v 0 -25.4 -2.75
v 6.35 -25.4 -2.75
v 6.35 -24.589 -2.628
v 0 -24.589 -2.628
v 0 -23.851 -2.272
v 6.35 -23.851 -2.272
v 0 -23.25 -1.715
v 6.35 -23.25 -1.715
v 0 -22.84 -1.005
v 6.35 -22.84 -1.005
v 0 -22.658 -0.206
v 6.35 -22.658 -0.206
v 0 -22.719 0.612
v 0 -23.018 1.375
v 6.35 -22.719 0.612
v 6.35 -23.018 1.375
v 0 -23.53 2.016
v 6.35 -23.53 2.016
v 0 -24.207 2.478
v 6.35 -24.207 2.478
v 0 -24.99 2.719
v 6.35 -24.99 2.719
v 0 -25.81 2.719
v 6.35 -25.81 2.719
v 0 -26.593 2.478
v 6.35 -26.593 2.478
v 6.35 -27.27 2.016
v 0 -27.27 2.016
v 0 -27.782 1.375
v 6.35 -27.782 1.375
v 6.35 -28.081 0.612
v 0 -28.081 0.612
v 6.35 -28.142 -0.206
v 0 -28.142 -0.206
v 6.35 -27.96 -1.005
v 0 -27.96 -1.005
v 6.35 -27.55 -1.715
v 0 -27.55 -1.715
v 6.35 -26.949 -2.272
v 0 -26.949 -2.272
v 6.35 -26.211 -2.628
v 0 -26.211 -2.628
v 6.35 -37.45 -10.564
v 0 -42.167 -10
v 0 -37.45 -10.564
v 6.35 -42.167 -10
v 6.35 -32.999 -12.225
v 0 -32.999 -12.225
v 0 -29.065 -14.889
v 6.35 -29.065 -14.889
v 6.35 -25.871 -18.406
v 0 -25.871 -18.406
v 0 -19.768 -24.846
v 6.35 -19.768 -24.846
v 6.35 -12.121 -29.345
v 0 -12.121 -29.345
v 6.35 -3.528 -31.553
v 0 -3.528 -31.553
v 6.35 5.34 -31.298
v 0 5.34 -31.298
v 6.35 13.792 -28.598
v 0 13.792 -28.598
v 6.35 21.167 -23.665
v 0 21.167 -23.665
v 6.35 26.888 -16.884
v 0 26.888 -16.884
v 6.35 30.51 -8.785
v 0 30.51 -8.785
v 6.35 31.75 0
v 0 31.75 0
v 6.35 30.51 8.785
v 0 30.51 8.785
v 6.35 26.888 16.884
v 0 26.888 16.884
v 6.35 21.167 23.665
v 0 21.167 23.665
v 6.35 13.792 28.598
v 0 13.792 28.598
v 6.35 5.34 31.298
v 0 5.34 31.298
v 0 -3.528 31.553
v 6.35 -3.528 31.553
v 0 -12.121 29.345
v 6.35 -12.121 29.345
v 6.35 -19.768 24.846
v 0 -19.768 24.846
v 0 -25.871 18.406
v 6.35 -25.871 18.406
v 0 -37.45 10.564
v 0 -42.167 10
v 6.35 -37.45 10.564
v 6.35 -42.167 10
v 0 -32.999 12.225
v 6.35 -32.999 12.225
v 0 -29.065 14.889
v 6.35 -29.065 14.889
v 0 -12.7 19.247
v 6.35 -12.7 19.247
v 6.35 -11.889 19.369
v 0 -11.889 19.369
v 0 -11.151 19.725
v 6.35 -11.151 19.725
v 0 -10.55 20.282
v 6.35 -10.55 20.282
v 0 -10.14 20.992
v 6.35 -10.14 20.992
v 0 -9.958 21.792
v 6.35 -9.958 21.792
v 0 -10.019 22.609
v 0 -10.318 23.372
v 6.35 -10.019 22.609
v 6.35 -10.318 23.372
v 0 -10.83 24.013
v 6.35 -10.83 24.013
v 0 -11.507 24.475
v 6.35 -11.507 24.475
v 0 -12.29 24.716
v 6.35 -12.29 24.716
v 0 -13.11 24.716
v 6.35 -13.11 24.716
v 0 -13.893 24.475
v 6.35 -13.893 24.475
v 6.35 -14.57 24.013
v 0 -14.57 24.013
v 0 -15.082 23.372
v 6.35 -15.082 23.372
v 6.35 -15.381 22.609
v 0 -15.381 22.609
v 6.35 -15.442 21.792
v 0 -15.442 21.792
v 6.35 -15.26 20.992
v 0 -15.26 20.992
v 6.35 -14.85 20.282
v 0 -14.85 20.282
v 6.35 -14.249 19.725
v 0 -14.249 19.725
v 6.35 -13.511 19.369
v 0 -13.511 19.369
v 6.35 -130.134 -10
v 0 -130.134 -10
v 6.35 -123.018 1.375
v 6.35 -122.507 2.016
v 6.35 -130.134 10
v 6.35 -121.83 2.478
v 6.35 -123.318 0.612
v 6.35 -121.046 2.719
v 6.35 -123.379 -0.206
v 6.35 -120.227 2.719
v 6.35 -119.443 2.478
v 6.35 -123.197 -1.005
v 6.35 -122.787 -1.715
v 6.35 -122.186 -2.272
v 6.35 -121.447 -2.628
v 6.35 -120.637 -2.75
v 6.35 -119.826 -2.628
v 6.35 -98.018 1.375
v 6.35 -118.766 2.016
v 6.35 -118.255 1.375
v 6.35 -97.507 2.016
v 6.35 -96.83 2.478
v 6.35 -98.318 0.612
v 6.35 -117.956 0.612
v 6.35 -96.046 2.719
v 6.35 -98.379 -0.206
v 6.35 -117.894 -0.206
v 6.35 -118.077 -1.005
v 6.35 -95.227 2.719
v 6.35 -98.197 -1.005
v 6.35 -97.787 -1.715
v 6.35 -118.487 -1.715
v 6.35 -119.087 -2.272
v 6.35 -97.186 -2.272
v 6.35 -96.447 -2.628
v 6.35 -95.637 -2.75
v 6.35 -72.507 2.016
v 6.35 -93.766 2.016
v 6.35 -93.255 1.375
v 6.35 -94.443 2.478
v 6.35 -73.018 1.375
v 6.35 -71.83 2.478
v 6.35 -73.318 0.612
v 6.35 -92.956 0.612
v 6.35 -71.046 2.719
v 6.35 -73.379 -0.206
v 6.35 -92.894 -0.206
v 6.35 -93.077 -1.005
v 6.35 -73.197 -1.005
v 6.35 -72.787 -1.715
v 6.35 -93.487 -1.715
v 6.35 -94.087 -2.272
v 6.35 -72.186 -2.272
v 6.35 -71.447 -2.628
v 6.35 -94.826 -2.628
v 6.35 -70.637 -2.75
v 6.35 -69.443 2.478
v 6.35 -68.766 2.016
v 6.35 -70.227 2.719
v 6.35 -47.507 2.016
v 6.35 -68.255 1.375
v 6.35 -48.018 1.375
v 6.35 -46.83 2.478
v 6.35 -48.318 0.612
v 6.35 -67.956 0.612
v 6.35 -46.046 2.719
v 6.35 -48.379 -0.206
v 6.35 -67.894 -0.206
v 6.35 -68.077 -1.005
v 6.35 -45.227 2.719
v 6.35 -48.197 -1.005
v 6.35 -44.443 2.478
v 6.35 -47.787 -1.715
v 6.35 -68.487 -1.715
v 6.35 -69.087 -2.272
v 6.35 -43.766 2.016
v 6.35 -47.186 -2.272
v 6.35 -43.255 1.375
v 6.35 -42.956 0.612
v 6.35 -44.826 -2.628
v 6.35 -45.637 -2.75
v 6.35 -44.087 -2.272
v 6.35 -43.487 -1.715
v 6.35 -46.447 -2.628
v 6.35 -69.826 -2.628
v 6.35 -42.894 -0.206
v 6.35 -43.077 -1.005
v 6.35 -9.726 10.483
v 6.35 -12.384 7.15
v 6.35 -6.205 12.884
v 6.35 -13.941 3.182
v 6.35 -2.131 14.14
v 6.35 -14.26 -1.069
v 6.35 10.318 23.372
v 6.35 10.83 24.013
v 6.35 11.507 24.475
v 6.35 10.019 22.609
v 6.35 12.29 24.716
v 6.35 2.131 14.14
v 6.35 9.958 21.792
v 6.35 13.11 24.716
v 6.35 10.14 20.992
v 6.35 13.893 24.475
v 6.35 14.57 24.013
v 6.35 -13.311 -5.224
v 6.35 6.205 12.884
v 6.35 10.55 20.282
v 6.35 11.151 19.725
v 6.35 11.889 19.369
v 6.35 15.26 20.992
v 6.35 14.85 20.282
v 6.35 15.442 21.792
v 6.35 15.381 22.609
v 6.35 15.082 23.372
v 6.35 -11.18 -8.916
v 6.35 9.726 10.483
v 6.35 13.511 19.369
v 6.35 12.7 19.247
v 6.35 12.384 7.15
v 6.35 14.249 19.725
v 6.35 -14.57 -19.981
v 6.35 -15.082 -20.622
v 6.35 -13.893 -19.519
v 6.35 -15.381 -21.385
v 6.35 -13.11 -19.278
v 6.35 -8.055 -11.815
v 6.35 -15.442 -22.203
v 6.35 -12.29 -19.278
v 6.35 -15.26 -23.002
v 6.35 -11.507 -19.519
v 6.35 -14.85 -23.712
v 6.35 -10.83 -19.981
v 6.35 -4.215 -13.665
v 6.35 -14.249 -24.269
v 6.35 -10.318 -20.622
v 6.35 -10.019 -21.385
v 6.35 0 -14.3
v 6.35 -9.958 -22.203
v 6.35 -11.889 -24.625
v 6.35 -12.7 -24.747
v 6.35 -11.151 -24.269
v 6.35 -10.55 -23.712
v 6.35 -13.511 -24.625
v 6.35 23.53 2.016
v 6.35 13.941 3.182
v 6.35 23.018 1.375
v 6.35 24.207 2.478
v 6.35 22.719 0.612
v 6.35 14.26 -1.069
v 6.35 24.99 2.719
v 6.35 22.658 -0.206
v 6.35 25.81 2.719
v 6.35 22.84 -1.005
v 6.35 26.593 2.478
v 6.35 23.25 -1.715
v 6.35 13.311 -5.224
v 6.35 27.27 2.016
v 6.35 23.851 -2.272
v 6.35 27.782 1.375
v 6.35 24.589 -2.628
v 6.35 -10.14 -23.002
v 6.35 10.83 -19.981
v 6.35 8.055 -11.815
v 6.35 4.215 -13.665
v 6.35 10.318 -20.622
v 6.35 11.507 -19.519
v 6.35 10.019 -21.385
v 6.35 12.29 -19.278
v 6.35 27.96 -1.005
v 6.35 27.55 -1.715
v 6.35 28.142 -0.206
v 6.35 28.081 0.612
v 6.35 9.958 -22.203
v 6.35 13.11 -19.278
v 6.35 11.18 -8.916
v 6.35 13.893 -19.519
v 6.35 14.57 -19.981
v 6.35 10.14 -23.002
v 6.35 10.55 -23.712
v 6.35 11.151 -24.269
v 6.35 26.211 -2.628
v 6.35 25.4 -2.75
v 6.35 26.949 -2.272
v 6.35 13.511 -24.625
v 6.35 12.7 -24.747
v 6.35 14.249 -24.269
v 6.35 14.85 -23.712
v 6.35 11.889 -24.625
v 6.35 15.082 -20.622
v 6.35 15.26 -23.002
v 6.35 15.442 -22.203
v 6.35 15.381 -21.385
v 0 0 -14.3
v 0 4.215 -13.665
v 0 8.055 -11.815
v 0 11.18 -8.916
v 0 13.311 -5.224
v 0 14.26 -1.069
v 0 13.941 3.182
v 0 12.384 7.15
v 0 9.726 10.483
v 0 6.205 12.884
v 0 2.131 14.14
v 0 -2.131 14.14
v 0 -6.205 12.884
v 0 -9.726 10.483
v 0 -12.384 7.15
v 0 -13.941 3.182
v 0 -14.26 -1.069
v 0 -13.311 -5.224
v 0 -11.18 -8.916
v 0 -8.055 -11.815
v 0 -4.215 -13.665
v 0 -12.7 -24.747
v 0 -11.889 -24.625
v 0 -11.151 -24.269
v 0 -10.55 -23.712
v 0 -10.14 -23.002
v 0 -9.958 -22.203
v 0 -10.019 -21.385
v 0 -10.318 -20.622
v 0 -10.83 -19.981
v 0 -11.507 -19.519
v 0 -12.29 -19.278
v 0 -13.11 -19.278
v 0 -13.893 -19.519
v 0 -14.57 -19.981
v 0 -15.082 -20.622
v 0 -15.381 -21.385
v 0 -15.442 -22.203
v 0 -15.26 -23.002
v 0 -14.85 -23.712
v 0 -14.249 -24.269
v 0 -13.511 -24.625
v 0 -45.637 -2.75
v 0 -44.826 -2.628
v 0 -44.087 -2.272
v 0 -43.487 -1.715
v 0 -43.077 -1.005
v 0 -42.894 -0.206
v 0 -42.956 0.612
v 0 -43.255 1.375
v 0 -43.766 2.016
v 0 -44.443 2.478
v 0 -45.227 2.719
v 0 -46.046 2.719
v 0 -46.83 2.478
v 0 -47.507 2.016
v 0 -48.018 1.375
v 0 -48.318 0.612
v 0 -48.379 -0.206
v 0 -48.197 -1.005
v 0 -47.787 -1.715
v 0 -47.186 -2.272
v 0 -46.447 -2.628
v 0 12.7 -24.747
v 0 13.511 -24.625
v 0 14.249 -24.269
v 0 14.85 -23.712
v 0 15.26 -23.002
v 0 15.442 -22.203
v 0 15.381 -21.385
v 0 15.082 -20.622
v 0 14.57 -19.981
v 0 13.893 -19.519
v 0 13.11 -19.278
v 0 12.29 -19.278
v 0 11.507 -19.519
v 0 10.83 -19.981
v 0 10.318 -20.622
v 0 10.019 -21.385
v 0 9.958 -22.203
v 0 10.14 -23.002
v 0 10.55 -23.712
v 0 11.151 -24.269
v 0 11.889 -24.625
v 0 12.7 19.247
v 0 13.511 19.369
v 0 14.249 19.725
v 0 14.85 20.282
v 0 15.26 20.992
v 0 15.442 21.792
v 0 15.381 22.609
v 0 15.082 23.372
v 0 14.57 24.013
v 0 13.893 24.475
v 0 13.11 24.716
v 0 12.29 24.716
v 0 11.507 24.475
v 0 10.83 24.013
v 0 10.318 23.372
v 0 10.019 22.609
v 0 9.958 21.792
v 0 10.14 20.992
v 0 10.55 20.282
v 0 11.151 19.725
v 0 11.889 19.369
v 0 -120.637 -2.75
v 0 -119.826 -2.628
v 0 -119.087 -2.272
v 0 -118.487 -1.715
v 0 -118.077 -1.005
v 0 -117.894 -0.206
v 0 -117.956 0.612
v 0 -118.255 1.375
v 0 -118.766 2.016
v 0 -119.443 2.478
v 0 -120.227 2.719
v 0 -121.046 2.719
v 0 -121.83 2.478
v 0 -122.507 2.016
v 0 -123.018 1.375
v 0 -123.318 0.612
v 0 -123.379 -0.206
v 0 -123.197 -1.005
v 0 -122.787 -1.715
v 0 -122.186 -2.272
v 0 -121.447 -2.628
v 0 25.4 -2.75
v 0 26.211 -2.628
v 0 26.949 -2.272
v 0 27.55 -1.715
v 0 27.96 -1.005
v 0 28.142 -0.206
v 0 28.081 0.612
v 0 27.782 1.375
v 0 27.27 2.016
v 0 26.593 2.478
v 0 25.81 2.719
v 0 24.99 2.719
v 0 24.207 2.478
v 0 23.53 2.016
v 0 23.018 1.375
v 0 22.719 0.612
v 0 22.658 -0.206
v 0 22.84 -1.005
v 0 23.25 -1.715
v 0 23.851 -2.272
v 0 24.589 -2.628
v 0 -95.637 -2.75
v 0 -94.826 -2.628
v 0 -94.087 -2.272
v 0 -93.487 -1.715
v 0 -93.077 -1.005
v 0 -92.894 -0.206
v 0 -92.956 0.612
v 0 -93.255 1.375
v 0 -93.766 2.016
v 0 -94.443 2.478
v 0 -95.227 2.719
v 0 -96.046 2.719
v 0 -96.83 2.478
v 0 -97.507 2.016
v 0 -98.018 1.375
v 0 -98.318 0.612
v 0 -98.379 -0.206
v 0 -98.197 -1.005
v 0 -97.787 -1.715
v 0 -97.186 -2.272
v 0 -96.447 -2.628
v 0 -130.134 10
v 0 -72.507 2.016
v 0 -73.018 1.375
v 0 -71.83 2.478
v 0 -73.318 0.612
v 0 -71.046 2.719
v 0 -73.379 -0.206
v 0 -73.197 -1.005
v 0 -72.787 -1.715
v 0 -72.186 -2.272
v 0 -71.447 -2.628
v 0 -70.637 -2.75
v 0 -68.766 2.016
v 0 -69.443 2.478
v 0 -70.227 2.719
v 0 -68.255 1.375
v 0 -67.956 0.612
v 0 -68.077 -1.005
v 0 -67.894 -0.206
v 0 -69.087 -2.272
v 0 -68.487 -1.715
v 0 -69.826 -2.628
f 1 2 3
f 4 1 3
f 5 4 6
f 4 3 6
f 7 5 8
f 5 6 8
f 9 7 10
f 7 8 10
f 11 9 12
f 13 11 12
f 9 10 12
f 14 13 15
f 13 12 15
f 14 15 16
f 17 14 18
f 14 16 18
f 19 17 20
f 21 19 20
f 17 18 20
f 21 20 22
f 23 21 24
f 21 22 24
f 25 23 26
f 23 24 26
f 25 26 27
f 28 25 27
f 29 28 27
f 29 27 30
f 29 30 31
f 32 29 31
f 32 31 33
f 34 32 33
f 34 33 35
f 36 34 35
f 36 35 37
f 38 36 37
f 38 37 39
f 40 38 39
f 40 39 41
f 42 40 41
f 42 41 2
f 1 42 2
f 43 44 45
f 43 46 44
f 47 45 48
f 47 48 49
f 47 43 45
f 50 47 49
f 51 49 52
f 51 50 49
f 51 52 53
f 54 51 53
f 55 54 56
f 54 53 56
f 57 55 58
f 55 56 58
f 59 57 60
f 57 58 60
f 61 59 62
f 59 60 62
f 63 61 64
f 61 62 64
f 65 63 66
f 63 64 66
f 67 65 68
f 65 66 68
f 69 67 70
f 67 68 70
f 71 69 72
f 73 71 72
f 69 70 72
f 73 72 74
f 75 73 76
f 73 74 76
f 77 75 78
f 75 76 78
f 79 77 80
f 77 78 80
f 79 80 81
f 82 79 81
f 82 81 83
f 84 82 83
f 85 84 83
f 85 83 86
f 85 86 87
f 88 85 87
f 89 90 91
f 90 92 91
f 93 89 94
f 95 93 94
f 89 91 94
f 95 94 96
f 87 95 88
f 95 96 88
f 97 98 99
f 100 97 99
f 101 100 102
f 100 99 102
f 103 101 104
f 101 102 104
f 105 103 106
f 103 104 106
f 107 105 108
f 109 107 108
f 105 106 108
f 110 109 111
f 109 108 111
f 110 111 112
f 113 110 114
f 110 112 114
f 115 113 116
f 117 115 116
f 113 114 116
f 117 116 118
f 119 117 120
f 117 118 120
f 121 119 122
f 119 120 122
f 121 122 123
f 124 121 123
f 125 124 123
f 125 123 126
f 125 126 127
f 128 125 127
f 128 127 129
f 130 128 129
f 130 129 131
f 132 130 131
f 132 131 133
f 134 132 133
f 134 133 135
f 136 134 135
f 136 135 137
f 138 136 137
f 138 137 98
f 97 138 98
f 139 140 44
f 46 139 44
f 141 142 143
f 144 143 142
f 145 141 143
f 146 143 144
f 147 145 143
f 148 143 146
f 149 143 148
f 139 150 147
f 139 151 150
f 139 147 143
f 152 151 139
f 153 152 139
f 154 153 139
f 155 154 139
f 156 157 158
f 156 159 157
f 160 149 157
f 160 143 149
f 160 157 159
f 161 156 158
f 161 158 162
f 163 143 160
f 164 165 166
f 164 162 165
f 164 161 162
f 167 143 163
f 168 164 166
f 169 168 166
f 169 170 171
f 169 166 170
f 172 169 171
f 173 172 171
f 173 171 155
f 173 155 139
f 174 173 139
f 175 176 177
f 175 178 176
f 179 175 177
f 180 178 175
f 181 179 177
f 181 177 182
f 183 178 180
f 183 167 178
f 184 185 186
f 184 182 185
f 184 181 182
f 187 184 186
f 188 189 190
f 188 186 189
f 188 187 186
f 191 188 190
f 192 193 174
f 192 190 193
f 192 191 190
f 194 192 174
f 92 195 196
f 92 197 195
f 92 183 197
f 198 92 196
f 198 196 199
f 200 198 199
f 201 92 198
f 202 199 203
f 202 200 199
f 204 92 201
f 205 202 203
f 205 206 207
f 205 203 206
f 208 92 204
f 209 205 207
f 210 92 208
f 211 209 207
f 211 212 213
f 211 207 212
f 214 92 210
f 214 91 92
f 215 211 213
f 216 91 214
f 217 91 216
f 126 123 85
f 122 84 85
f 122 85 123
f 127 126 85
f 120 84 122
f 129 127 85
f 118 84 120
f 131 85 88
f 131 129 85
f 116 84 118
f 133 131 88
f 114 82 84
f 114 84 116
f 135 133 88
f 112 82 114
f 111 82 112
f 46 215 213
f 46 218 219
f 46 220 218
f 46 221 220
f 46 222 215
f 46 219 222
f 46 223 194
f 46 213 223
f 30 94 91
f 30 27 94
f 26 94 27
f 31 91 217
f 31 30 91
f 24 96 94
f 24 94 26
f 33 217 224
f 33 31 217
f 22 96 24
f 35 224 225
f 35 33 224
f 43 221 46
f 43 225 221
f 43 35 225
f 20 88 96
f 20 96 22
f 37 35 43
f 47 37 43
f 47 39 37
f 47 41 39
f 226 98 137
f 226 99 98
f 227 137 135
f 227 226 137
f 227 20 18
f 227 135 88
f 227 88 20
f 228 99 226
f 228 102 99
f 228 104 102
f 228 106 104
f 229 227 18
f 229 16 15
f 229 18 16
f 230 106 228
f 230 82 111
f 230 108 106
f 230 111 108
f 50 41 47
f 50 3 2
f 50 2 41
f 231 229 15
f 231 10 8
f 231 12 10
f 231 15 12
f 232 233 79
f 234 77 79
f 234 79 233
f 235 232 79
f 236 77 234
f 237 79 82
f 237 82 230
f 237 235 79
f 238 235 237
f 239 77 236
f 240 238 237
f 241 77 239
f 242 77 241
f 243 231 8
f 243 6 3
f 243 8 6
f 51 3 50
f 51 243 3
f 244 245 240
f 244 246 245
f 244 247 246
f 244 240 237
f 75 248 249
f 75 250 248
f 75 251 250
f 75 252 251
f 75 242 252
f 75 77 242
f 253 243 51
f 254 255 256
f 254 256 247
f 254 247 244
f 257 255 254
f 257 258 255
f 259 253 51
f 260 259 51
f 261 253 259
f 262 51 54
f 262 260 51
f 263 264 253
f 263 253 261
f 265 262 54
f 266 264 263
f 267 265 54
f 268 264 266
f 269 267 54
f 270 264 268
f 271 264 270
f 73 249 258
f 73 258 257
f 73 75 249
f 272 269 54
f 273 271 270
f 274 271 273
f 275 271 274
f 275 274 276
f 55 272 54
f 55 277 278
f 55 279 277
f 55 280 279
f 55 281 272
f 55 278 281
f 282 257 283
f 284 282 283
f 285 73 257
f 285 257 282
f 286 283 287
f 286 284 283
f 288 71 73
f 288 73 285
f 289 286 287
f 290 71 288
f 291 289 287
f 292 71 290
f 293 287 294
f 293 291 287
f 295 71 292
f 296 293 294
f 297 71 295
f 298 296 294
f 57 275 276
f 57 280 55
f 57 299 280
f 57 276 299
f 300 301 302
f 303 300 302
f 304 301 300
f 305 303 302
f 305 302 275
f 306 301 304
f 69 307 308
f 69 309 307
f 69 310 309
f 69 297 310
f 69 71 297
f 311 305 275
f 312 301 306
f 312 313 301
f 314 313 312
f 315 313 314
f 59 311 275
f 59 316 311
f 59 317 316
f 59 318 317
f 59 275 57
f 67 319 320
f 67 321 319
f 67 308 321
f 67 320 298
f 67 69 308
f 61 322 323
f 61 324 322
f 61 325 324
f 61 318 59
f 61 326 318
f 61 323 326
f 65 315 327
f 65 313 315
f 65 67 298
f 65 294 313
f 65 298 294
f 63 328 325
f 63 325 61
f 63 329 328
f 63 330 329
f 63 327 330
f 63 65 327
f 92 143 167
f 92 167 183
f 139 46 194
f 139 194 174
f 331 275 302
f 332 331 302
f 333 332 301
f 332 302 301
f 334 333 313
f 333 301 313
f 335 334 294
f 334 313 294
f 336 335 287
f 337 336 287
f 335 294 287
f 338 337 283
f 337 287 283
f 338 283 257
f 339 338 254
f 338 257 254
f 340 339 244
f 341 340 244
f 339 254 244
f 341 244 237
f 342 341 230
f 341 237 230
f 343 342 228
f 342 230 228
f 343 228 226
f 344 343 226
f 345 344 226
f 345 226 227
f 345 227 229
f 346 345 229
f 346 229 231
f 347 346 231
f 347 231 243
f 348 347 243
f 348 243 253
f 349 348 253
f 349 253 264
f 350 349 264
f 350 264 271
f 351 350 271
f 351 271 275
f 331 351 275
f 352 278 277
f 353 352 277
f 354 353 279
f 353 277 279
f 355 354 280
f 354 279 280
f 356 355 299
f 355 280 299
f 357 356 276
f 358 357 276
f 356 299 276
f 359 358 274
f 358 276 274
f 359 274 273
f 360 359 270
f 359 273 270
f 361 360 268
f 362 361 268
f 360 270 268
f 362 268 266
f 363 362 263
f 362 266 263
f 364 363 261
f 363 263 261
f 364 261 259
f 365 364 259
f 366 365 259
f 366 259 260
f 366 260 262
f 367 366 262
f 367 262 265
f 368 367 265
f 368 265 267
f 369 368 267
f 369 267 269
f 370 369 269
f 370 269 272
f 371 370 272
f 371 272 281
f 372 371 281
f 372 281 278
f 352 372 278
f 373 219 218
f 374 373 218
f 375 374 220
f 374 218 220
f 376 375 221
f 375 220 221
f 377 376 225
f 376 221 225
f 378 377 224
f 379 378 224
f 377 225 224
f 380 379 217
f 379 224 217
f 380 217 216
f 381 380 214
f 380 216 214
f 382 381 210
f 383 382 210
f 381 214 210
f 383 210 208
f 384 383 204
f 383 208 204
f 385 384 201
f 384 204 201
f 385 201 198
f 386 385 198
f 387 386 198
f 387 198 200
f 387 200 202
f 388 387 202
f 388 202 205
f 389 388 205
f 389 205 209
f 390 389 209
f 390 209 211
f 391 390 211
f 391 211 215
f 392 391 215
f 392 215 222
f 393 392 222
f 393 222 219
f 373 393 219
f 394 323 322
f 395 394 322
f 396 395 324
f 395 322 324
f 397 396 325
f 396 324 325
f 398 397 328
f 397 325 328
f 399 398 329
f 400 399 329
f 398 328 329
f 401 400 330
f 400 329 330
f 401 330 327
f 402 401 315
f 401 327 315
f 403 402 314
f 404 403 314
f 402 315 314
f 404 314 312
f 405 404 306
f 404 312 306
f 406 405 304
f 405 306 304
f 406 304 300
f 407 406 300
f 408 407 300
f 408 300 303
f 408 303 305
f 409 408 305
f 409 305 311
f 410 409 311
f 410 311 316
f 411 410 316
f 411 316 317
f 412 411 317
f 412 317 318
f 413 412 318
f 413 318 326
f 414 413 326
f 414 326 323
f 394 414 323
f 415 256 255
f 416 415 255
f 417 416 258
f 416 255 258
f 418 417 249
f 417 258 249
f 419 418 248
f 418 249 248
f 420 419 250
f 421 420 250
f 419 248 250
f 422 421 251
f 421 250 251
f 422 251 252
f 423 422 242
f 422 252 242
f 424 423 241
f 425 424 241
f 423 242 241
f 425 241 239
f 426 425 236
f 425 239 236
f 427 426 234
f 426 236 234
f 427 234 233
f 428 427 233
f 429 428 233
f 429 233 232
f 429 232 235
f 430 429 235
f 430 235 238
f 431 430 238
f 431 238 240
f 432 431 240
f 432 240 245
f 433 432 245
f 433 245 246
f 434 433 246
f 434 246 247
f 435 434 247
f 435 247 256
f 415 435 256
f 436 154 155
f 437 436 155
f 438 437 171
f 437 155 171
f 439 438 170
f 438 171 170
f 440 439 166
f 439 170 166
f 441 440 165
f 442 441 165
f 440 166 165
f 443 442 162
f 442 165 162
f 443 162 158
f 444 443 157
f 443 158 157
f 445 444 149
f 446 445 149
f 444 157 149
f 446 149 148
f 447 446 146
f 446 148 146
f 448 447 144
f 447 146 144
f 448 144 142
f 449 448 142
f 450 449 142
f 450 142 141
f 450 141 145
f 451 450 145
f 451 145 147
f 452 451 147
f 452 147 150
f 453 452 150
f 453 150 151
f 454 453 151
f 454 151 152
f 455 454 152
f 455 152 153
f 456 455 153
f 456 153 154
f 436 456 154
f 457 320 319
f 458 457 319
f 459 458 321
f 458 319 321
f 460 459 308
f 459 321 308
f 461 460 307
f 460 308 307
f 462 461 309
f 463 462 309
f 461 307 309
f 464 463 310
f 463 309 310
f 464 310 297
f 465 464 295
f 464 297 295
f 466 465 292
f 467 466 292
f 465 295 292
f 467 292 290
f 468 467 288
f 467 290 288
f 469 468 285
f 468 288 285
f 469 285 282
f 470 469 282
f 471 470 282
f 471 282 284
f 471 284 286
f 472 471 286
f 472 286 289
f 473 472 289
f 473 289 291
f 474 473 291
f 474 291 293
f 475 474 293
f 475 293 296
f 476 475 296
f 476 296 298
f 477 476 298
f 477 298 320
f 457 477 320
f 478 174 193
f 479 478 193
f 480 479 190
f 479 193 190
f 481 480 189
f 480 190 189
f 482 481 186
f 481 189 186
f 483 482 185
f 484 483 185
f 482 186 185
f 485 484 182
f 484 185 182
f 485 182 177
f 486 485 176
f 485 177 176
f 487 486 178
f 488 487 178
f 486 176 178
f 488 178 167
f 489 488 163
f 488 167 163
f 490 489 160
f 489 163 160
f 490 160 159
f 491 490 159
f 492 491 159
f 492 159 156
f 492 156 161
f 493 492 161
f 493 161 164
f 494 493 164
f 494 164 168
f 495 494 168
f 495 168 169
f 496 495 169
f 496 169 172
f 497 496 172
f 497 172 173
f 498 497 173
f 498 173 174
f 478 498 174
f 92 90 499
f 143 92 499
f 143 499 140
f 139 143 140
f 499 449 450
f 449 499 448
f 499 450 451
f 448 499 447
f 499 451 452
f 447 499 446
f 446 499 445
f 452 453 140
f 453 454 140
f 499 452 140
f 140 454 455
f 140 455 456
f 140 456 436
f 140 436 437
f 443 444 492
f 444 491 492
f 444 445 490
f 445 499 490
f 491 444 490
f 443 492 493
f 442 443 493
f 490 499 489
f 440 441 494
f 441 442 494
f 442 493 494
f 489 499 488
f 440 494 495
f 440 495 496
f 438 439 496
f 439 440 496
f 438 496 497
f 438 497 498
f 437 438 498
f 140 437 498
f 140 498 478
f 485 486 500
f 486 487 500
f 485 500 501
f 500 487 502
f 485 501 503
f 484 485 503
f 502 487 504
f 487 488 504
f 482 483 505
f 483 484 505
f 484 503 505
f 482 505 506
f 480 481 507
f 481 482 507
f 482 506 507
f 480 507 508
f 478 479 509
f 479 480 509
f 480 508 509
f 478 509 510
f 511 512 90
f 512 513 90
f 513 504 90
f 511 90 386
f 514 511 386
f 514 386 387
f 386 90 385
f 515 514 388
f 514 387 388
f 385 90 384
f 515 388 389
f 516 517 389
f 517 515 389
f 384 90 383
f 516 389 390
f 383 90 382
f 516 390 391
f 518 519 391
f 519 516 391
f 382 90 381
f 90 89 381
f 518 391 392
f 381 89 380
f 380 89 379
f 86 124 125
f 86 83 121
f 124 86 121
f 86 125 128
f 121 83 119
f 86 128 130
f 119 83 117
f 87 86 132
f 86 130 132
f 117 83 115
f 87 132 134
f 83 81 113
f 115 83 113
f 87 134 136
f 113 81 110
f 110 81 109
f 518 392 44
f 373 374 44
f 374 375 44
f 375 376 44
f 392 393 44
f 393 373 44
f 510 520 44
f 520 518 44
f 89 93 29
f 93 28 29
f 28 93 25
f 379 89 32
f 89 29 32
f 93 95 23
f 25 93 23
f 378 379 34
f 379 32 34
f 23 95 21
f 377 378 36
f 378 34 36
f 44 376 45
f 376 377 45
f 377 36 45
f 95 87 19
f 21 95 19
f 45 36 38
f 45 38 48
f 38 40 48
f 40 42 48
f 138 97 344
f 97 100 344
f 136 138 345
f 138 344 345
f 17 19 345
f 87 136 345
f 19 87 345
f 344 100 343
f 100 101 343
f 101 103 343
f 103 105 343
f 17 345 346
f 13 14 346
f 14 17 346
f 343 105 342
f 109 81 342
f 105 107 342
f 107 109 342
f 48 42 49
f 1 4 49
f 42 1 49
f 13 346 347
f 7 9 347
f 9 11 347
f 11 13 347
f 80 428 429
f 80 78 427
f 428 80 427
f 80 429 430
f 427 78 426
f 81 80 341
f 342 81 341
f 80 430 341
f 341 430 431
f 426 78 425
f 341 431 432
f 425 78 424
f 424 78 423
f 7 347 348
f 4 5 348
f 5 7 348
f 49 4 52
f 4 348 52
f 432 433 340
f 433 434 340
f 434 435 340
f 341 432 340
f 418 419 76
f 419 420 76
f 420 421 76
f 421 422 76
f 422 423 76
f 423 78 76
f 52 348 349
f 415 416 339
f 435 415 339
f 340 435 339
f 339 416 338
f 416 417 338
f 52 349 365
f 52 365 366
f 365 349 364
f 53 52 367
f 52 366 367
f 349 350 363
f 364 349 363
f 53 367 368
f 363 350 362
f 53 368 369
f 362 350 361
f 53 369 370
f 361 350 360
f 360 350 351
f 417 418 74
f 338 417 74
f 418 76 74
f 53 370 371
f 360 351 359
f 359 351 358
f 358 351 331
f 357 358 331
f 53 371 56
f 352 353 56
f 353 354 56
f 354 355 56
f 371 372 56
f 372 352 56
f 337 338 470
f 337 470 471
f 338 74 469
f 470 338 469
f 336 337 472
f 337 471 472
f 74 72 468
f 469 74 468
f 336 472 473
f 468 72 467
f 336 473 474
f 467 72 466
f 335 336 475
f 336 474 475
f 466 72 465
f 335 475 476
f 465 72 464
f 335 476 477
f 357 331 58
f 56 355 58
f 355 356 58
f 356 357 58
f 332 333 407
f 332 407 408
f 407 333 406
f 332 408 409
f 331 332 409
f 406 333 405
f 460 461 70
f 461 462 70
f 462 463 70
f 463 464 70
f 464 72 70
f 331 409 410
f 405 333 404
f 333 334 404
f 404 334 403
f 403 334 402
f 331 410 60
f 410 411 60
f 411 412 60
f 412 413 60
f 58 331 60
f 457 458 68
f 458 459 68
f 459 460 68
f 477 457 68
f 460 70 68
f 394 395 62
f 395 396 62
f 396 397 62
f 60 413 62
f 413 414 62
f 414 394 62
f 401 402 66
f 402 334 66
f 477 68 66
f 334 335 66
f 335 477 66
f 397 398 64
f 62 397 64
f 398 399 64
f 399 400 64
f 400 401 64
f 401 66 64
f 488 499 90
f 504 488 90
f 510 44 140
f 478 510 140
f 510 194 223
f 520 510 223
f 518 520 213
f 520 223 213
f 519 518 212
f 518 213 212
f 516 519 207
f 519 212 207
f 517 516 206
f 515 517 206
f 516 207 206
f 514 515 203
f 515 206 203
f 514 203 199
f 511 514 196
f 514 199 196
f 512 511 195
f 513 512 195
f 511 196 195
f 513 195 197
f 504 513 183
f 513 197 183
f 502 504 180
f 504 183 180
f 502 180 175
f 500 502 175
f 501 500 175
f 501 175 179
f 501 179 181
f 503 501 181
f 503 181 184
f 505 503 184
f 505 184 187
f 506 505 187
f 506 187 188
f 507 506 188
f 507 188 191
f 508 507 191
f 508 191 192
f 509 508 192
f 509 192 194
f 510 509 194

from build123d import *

# Parameters (mm, degrees)
BOSS_EXTRUDE1_DEPTH = 6.35
FILLET1_R           = 20
SKETCH2_R           = 14.3
SKETCH2_R_2         = 2.75
CUT_EXTRUDE1_DEPTH  = 7.35
SKETCH3_R           = 2.75
CUT_EXTRUDE2_DEPTH  = 7.35


with BuildPart() as part:
    # Sketch1 → Boss-Extrude1 (new body)
    with BuildSketch(Plane(origin=(0, 0, 0), x_dir=(0, 0, -1), z_dir=(1, 0, 0))):
        with BuildLine():
            Line((-10, -30.134075396), (-10, -130.134075396))
            Line((-10, -130.134075396), (10, -130.134075396))
            Line((10, -130.134075396), (10, -30.134075396))
            ThreePointArc((10, -30.134075396), (0, 31.75), (-10, -30.134075396))
        make_face()
    extrude(amount=BOSS_EXTRUDE1_DEPTH)

    # Fillet1
    fillet1_edges = [part.edges().sort_by_distance(p)[0] for p in [
        (3.175, -30.134075396, -10),
        (3.175, -30.134075396, 10),
    ]]
    fillet(fillet1_edges, radius=FILLET1_R)

    # Sketch2 → Cut-Extrude1 (cut, through all)
    with BuildSketch(Plane(origin=(6.35, 0, 0), x_dir=(0, 0, -1), z_dir=(1, 0, 0))):
        Circle(SKETCH2_R)
        with Locations((0, 25.4)):
            Circle(SKETCH2_R_2)
        with Locations((21.997045256, 12.7)):
            Circle(SKETCH2_R_2)
        with Locations((21.997045256, -12.7)):
            Circle(SKETCH2_R_2)
        with Locations((0, -25.4)):
            Circle(SKETCH2_R_2)
        with Locations((-21.997045256, -12.7)):
            Circle(SKETCH2_R_2)
        with Locations((-21.997045256, 12.7)):
            Circle(SKETCH2_R_2)
    extrude(amount=-CUT_EXTRUDE1_DEPTH, mode=Mode.SUBTRACT)

    # Sketch3 → Cut-Extrude2 (cut, through all)
    with BuildSketch(Plane(origin=(6.35, 0, 0), x_dir=(0, 0, -1), z_dir=(1, 0, 0))):
        with Locations((0, -120.63662428)):
            Circle(SKETCH3_R)
        with Locations((0, -95.63662428)):
            Circle(SKETCH3_R)
        with Locations((0, -70.63662428)):
            Circle(SKETCH3_R)
        with Locations((0, -45.63662428)):
            Circle(SKETCH3_R)
    extrude(amount=-CUT_EXTRUDE2_DEPTH, mode=Mode.SUBTRACT)


solid = part.part
